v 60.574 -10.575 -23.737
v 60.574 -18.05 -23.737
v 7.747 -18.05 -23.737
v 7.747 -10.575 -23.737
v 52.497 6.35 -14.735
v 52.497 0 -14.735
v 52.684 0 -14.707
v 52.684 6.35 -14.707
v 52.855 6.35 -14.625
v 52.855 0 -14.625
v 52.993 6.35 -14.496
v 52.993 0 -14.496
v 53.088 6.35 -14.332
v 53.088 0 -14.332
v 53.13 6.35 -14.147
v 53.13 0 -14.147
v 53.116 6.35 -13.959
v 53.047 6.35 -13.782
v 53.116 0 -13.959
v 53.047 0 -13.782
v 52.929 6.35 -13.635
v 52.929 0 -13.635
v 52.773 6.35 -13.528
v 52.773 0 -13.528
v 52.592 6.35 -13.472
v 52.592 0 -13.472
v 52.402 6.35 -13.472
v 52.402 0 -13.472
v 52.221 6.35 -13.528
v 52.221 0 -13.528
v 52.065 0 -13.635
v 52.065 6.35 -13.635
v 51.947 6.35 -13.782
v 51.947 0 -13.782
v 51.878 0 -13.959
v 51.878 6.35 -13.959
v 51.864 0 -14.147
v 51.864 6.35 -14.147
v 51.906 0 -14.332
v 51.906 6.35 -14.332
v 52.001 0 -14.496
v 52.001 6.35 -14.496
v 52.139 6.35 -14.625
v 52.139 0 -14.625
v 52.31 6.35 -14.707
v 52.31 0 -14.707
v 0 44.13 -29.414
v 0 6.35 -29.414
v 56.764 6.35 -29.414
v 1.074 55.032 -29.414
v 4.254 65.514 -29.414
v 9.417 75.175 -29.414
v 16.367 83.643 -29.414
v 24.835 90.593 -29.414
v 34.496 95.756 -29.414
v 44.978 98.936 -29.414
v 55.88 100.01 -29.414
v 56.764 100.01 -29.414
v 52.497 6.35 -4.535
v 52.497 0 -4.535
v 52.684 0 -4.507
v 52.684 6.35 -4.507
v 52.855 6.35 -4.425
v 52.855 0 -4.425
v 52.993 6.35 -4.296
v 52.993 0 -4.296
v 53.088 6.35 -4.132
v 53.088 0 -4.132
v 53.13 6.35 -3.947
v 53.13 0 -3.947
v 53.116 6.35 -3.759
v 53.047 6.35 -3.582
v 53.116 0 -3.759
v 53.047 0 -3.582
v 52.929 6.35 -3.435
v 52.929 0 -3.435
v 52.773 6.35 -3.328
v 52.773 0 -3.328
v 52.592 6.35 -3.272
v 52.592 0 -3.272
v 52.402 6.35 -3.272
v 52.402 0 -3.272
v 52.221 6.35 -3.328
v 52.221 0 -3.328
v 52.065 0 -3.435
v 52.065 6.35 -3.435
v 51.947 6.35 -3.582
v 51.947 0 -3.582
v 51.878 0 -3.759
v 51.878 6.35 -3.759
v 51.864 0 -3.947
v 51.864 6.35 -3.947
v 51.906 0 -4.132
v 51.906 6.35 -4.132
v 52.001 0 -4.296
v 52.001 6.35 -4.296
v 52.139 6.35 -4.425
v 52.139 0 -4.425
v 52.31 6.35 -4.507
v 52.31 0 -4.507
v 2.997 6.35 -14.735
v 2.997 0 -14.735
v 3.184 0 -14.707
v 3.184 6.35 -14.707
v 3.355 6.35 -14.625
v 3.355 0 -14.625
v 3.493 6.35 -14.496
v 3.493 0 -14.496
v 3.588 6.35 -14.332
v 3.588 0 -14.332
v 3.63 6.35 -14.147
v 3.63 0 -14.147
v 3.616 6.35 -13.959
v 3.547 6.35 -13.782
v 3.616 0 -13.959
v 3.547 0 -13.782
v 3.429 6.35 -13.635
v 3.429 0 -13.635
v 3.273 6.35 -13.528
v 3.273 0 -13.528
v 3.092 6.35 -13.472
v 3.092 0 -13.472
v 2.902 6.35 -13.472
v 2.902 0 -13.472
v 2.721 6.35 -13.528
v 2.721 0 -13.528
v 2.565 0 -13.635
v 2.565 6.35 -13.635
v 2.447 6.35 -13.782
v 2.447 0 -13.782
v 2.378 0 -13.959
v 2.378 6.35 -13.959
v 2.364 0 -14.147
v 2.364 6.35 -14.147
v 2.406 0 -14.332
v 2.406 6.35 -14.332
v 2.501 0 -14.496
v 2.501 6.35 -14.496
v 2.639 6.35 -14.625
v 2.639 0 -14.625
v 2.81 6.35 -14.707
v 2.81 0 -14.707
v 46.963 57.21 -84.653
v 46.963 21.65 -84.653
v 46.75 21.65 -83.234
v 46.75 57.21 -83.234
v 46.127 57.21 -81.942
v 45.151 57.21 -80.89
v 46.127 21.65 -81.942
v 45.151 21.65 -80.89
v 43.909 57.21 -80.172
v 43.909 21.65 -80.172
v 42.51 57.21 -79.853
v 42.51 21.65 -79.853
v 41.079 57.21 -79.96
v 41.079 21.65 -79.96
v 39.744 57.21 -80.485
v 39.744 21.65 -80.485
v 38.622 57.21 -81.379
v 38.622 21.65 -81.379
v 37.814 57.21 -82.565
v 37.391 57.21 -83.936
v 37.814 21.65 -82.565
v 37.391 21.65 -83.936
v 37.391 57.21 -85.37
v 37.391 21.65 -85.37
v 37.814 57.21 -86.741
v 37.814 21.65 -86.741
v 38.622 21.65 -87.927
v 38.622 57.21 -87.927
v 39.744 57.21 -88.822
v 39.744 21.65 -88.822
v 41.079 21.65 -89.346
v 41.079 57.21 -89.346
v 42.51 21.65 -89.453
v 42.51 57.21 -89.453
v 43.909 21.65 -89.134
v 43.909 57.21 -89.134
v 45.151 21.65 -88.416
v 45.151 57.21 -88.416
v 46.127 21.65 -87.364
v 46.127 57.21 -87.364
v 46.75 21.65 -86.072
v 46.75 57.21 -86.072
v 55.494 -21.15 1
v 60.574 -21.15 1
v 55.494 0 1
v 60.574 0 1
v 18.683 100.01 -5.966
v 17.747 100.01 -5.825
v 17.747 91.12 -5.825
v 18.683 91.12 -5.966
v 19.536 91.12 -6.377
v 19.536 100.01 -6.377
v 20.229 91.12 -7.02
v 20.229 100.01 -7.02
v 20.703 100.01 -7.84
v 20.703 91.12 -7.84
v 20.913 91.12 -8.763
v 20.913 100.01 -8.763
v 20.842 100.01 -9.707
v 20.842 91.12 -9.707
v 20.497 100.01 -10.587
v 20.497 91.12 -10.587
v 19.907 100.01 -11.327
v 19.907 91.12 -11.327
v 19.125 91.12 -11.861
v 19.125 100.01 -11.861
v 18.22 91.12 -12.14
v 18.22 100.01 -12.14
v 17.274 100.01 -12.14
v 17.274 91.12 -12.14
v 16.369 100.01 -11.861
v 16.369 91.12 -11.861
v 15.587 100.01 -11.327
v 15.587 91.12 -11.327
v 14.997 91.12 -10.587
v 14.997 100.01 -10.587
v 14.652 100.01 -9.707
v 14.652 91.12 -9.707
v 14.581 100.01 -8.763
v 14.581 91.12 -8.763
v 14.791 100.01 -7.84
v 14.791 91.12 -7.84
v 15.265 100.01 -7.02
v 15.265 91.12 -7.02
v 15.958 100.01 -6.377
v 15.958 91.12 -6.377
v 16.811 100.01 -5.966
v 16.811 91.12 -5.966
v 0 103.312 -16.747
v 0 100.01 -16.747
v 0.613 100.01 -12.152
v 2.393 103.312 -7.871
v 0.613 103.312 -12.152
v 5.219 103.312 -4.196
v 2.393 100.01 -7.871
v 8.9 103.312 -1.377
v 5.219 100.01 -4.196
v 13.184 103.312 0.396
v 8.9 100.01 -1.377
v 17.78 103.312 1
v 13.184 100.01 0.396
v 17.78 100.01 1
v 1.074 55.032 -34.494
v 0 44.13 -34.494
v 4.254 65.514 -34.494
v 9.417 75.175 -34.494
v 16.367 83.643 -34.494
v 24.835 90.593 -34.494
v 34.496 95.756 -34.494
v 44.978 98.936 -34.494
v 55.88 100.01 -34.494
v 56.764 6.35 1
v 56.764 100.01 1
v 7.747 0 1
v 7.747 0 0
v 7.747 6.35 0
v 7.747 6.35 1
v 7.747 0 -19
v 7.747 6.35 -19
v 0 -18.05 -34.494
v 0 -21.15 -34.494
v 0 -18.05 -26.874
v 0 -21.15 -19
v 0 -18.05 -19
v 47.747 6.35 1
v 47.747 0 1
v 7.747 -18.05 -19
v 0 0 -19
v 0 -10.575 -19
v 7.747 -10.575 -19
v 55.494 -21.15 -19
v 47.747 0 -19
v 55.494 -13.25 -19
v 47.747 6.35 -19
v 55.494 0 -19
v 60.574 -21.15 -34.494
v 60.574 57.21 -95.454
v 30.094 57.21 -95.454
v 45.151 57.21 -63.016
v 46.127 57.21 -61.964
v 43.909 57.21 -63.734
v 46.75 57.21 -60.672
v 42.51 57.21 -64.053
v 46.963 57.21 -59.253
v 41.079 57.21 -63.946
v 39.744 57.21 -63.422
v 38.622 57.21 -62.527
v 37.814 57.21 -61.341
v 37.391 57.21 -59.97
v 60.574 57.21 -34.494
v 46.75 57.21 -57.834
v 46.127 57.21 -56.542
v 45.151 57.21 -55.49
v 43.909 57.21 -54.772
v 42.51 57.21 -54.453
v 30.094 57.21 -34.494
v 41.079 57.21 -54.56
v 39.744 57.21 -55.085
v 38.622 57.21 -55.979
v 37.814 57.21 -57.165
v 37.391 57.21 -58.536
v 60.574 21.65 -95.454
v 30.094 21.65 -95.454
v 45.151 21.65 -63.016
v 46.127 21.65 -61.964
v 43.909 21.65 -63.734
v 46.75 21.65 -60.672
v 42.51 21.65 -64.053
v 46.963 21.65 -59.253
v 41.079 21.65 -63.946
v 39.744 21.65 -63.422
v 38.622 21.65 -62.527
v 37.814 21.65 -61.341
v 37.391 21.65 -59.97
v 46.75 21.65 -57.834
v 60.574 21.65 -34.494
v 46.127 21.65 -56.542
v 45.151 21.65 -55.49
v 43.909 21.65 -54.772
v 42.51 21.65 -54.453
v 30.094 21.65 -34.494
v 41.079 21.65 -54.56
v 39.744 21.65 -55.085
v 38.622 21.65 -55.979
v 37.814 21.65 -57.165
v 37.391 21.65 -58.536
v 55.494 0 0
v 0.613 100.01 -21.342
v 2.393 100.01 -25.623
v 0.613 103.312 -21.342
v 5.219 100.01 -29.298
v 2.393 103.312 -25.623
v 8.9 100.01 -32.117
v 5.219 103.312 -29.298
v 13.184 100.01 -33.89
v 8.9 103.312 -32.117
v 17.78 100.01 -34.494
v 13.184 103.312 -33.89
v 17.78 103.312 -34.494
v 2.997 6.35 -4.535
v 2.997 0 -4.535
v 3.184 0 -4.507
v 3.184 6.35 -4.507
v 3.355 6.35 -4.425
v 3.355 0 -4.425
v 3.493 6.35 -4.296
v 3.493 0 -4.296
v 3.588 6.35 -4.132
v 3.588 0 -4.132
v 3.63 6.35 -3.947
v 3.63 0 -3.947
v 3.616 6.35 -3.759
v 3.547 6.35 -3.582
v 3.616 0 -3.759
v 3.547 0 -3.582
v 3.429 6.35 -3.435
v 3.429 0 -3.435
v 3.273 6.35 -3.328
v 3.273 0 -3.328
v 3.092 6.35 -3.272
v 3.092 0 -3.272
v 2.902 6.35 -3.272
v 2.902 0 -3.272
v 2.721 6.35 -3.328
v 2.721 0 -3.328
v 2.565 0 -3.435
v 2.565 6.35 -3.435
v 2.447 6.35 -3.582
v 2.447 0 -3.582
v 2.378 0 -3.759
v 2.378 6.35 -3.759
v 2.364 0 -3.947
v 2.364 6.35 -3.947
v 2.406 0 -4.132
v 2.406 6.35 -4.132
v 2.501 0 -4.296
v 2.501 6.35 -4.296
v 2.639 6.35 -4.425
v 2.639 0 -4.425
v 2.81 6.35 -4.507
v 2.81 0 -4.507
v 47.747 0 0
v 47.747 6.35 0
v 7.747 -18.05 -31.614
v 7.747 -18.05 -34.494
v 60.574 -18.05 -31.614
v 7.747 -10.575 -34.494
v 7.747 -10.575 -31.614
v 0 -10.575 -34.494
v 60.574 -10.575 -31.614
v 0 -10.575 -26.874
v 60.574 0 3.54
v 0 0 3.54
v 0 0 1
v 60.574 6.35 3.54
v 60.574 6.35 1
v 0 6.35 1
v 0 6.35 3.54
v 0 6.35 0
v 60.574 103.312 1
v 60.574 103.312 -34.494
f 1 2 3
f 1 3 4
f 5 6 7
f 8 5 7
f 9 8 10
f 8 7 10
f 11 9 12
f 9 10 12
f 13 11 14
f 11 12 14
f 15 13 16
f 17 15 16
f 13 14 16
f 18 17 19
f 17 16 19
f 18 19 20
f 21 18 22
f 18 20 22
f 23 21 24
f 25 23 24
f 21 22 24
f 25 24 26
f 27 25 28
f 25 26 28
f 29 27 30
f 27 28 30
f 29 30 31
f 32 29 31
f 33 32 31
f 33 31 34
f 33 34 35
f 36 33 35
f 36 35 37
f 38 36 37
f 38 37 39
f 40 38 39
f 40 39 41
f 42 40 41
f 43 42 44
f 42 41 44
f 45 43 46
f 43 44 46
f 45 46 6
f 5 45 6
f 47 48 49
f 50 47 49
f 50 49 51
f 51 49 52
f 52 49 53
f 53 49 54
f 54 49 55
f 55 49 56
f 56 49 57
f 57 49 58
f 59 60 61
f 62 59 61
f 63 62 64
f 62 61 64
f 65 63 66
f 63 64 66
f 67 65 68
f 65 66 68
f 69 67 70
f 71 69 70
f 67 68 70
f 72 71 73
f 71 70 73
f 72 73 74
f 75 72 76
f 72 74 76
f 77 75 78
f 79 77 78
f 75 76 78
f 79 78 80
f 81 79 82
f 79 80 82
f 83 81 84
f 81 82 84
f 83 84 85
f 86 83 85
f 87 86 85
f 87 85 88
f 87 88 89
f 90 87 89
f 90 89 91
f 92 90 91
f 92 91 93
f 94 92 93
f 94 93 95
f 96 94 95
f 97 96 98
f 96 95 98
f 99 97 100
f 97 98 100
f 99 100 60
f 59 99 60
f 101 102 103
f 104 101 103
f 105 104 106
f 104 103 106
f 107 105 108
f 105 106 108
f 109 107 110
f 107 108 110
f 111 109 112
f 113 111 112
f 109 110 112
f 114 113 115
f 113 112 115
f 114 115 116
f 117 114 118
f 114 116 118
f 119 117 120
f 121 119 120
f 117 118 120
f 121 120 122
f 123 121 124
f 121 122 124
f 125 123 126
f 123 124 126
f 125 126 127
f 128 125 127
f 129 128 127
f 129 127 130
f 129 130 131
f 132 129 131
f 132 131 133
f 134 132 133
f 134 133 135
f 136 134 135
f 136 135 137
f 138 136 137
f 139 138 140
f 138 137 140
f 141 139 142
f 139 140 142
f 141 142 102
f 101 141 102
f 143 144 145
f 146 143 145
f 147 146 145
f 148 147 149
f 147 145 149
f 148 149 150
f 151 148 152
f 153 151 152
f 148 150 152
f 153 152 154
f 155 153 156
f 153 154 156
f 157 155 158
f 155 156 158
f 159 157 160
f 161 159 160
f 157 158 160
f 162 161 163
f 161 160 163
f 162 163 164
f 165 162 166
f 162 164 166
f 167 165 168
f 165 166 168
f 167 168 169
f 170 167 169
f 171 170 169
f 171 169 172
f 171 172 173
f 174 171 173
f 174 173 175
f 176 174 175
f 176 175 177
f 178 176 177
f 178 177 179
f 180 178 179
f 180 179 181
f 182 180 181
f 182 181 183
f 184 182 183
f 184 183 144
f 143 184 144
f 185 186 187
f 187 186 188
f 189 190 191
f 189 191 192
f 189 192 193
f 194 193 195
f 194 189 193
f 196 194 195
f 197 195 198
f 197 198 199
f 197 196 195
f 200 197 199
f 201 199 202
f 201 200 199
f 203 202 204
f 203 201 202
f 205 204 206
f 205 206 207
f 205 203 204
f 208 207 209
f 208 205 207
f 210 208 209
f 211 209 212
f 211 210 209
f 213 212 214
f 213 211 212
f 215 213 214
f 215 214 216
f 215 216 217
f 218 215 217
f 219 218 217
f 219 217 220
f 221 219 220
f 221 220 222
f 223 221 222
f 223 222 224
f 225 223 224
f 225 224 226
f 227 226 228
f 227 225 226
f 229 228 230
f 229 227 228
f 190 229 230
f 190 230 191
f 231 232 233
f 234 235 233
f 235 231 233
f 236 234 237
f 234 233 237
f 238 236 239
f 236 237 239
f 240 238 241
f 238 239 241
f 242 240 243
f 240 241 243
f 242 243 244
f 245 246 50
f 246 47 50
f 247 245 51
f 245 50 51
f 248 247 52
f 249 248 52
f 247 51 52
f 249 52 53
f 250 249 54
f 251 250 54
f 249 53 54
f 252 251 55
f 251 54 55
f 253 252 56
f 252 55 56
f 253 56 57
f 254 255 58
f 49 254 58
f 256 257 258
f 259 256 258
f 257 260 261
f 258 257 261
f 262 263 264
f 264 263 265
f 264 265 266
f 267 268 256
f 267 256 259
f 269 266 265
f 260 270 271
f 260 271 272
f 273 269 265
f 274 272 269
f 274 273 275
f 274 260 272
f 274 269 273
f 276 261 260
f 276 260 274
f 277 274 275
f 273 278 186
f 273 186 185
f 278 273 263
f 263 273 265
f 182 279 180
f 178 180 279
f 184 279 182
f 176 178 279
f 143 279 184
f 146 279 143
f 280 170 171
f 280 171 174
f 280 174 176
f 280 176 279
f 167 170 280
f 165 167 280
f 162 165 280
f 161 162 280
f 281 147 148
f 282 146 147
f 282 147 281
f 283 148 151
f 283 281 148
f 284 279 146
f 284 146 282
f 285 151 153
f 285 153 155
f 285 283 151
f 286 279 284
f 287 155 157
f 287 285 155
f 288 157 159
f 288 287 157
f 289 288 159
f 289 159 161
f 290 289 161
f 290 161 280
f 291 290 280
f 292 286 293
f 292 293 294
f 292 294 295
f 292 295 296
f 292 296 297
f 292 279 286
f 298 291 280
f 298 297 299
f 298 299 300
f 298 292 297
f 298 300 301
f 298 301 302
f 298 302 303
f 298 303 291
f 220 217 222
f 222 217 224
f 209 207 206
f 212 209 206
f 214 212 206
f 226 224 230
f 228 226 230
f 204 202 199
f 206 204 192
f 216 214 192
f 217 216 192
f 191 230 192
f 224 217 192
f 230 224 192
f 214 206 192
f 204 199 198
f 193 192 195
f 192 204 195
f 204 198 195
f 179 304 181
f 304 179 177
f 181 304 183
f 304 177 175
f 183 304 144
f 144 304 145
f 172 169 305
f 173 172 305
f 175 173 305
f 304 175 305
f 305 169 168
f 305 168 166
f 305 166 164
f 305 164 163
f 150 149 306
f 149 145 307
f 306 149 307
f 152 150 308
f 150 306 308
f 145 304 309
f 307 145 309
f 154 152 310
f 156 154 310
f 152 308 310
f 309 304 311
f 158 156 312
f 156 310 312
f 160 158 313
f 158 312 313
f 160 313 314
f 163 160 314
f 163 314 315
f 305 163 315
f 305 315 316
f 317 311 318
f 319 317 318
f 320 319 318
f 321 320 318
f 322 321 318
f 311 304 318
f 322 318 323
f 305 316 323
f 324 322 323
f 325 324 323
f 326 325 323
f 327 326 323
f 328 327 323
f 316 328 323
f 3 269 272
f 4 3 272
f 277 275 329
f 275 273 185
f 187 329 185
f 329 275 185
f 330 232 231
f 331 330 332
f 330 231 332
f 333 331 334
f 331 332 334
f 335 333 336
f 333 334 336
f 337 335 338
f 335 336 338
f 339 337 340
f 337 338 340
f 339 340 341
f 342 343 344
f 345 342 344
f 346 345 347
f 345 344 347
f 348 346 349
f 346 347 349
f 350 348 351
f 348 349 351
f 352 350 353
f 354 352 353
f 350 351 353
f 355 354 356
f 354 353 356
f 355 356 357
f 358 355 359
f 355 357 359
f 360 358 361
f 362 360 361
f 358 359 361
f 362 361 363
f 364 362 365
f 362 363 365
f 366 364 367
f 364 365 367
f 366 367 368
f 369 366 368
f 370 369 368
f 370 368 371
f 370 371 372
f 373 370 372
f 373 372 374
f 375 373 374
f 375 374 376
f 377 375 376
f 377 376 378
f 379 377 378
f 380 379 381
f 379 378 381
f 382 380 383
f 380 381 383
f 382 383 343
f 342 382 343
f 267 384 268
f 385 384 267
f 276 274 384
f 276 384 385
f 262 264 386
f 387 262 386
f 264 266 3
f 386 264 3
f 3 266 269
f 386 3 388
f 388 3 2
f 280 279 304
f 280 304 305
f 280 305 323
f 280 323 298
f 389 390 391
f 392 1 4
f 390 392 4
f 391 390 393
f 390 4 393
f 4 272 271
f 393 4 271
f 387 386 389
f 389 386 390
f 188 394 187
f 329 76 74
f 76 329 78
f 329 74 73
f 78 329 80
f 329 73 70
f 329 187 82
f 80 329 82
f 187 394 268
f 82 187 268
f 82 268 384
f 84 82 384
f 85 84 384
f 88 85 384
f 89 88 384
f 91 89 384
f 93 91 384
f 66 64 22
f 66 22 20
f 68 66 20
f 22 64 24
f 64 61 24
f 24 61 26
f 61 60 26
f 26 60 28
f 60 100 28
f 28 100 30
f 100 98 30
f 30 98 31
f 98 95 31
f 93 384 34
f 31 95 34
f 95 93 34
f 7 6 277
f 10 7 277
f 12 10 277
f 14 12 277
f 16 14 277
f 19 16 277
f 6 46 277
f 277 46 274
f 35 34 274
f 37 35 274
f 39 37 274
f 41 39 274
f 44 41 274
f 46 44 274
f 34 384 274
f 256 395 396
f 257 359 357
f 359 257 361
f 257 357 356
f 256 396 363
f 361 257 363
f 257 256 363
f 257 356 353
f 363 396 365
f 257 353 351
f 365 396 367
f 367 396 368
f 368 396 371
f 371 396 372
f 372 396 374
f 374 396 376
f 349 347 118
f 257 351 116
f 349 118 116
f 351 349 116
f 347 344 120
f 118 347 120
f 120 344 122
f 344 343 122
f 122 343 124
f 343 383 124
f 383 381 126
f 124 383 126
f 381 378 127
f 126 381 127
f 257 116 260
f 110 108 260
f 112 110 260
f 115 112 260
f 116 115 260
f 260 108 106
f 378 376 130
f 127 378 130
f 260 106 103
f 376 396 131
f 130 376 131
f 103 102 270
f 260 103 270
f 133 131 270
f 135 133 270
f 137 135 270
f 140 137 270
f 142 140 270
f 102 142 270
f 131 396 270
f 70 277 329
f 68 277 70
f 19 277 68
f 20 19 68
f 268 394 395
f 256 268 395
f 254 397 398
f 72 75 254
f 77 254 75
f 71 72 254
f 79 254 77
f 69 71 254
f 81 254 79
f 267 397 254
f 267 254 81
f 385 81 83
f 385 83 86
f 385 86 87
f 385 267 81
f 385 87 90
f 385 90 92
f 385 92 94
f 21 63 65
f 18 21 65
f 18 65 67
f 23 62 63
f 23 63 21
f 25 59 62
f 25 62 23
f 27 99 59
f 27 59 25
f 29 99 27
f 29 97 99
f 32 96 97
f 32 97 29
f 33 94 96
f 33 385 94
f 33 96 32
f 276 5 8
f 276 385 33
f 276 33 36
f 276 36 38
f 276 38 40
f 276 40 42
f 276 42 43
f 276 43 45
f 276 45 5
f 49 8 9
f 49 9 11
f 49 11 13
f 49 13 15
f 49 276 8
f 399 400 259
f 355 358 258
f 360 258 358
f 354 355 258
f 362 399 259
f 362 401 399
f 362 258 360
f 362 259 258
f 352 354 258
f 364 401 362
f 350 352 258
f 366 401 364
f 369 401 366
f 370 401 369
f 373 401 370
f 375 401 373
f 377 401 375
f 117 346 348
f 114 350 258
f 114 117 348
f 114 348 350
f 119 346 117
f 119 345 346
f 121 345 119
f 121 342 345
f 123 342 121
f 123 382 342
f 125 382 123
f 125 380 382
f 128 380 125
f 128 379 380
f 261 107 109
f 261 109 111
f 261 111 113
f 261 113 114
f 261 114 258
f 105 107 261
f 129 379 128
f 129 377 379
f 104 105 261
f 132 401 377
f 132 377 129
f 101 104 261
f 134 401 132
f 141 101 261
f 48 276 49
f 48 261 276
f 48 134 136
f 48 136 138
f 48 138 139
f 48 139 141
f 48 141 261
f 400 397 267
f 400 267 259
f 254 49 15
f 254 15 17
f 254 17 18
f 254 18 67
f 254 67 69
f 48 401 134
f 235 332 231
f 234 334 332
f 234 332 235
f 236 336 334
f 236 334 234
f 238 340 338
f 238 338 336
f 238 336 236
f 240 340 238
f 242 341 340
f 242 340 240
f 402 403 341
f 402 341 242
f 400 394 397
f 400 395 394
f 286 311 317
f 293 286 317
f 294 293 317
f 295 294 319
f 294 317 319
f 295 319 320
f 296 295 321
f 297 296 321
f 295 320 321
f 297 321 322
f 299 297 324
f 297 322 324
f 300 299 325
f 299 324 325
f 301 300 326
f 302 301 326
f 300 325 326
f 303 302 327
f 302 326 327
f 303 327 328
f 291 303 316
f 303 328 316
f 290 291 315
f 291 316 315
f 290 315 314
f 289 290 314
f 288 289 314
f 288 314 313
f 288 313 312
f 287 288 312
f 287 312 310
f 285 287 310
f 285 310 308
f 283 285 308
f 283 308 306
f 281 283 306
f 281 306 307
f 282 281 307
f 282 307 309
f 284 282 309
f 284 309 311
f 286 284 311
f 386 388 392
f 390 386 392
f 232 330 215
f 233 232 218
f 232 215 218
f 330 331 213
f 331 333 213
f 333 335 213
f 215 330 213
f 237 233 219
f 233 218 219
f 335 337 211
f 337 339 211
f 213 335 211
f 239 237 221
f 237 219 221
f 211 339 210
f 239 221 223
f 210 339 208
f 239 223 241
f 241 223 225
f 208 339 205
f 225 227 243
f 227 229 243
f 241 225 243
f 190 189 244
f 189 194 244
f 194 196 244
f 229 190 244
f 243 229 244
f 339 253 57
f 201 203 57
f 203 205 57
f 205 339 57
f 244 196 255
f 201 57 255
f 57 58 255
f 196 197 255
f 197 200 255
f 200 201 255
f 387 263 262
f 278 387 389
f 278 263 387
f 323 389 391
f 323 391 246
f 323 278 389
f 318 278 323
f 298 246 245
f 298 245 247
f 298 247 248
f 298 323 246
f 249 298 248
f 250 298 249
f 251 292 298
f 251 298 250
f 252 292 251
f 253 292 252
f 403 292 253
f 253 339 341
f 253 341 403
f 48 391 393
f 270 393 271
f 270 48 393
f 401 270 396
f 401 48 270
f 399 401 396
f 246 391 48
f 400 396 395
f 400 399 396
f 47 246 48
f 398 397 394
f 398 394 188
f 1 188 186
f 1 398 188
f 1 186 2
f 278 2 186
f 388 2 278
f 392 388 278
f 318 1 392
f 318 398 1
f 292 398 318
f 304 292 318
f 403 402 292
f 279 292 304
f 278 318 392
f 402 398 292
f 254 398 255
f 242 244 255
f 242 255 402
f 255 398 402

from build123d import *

# Parameters (mm, degrees)
SKETCH1_W            = 55.49400001
SKETCH1_H            = 26.874
BOSS_EXTRUDE1_DEPTH  = 6.35
SKETCH2_W            = 40
SKETCH2_H            = 19
CUT_EXTRUDE1_DEPTH   = 6.35
SKETCH3_R            = 0.635
CUT_EXTRUDE2_DEPTH   = 6.35
SKETCH4_W            = 55.49400001
SKETCH4_H            = 7.874
BOSS_EXTRUDE2_DEPTH  = 21.15
SKETCH6_W            = 7.747000005
SKETCH6_H            = 6.35
BOSS_EXTRUDE3_DEPTH  = 1
SKETCH12_W           = 7.747000005
SKETCH12_H           = 7.475
CUT_EXTRUDE4_DEPTH   = 9.398
SKETCH13_W           = 7.747000005
SKETCH13_H           = 7.9
BOSS_EXTRUDE6_DEPTH  = 20
SKETCH14_W           = 27.874
SKETCH14_H           = 27.5
BOSS_EXTRUDE7_DEPTH  = 5.08
SKETCH16_W           = 3.81
SKETCH16_H           = 27.874
BOSS_EXTRUDE8_DEPTH  = 93.66
BOSS_EXTRUDE9_DEPTH  = 7.62
SKETCH18_W           = 5.08
SKETCH18_H           = 93.66
BOSS_EXTRUDE10_DEPTH = 56.76400001
SKETCH19_W           = 30.48
SKETCH19_H           = 35.56
BOSS_EXTRUDE11_DEPTH = 76.2
SKETCH20_R           = 4.813300002
SKETCH20_R_2         = 4.813299999
CUT_EXTRUDE5_DEPTH   = 76.2
SKETCH21_W           = 30.48
SKETCH21_H           = 35.56
CUT_EXTRUDE6_DEPTH   = 15.24
SKETCH23_W           = 7.876812164
SKETCH23_H           = 7.475
CUT_EXTRUDE7_DEPTH   = 54.102
FILLET1_R            = 55.88
SKETCH24_W           = 3.81
SKETCH24_H           = 35.494
BOSS_EXTRUDE12_DEPTH = 3.302
SKETCH25_W           = 35.494
SKETCH25_H           = 3.302
BOSS_EXTRUDE13_DEPTH = 56.76400001
FILLET2_R            = 17.78
SKETCH26_R           = 3.175
BOSS_EXTRUDE14_DEPTH = 8.89
SKETCH27_W           = 7.747000005
SKETCH27_H           = 20
CUT_EXTRUDE9_DEPTH   = 10.668
SKETCH28_W           = 7.747000005
SKETCH28_H           = 6.35
BOSS_EXTRUDE15_DEPTH = 2.54
SKETCH29_W           = 2.54
SKETCH29_H           = 6.35
BOSS_EXTRUDE16_DEPTH = 47.747000005
SKETCH30_W           = 2.54
SKETCH30_H           = 6.35
BOSS_EXTRUDE17_DEPTH = 5.08


with BuildPart() as part:
    # Sketch1 → Boss-Extrude1 (new body)
    with BuildSketch(Plane(origin=(0, 0, 0), x_dir=(1, 0, 0), z_dir=(0, 1, 0))):
        with Locations((27.747000005, 13.437)):
            Rectangle(SKETCH1_W, SKETCH1_H)
    extrude(amount=BOSS_EXTRUDE1_DEPTH)

    # Sketch2 → Cut-Extrude1 (cut)
    with BuildSketch(Plane(origin=(0, 6.35, 0), x_dir=(1, 0, 0), z_dir=(0, 1, 0))):
        with Locations((27.747000005, 9.5)):
            Rectangle(SKETCH2_W, SKETCH2_H)
    extrude(amount=-CUT_EXTRUDE1_DEPTH, mode=Mode.SUBTRACT)

    # Sketch3 → Cut-Extrude2 (cut)
    with BuildSketch(Plane.XZ):
        with Locations(Location((2.997000004, -14.099999999, 0), (0, 0, 270))):
            Circle(SKETCH3_R)
        with Locations(Location((2.997000004, -3.899999999, 0), (0, 0, 270))):
            Circle(SKETCH3_R)
        with Locations(Location((52.497000004, -14.099999999, 0), (0, 0, 270))):
            Circle(SKETCH3_R)
        with Locations(Location((52.497000004, -3.899999999, 0), (0, 0, 270))):
            Circle(SKETCH3_R)
    extrude(amount=-CUT_EXTRUDE2_DEPTH, mode=Mode.SUBTRACT)

    # Sketch4 → Boss-Extrude2 (add)
    with BuildSketch(Plane.XZ):
        with Locations((27.747000005, -22.937)):
            Rectangle(SKETCH4_W, SKETCH4_H)
    extrude(amount=BOSS_EXTRUDE2_DEPTH)

    # Sketch6 → Boss-Extrude3 (add)
    with BuildSketch(Plane.XY):
        with Locations((3.873500003, 3.175)):
            Rectangle(SKETCH6_W, SKETCH6_H)
        with Locations((51.620500007, 3.175)):
            Rectangle(SKETCH6_W, SKETCH6_H)
    extrude(amount=BOSS_EXTRUDE3_DEPTH)

    # Sketch12 → Cut-Extrude4 (cut)
    with BuildSketch(Plane.XY.offset(-19)):
        with Locations((3.873500003, -14.3125)):
            Rectangle(SKETCH12_W, SKETCH12_H)
    extrude(amount=-CUT_EXTRUDE4_DEPTH, mode=Mode.SUBTRACT)

    # Sketch13 → Boss-Extrude6 (add)
    with BuildSketch(Plane.XY.offset(-19)):
        with Locations((51.620500007, -17.2)):
            Rectangle(SKETCH13_W, SKETCH13_H)
    extrude(amount=BOSS_EXTRUDE6_DEPTH)

    # Sketch14 → Boss-Extrude7 (add)
    with BuildSketch(Plane(origin=(55.49400001, 0, 0), x_dir=(0, 0, -1), z_dir=(1, 0, 0))):
        with Locations((12.937, -7.4)):
            Rectangle(SKETCH14_W, SKETCH14_H)
    extrude(amount=BOSS_EXTRUDE7_DEPTH)

    # Sketch16 → Boss-Extrude8 (add)
    with BuildSketch(Plane(origin=(0, 6.35, 0), x_dir=(1, 0, 0), z_dir=(0, 1, 0))):
        with Locations((58.66900001, 12.937)):
            Rectangle(SKETCH16_W, SKETCH16_H)
    extrude(amount=BOSS_EXTRUDE8_DEPTH)

    # Sketch17 → Boss-Extrude9 (add)
    with BuildSketch(Plane(origin=(0, 0, -26.874), x_dir=(-1, 0, 0), z_dir=(0, 0, -1))):
        Polygon((0, -21.15), (0, -18.05), (-7.747000005, -18.05), (-7.747000005, -10.575), (0, -10.575), (0, 6.35), (-56.76400001, 6.35), (-56.76400001, 100.01), (-60.57400001, 100.01), (-60.57400001, -21.15), align=None)
    extrude(amount=BOSS_EXTRUDE9_DEPTH)

    # Sketch18 → Boss-Extrude10 (add)
    with BuildSketch(Plane.ZY.offset(-56.76400001)):
        with Locations((-31.954, 53.18)):
            Rectangle(SKETCH18_W, SKETCH18_H)
    extrude(amount=BOSS_EXTRUDE10_DEPTH)

    # Sketch19 → Boss-Extrude11 (add)
    with BuildSketch(Plane(origin=(0, 0, -34.494), x_dir=(-1, 0, 0), z_dir=(0, 0, -1))):
        with Locations((-45.33400001, 39.43)):
            Rectangle(SKETCH19_W, SKETCH19_H)
    extrude(amount=BOSS_EXTRUDE11_DEPTH)

    # Sketch20 → Cut-Extrude5 (cut)
    with BuildSketch(Plane.XZ.offset(-21.65)):
        with Locations((42.150157054, -59.253068288)):
            Circle(SKETCH20_R)
        with Locations((42.150157054, -84.653068288)):
            Circle(SKETCH20_R_2)
    extrude(amount=-CUT_EXTRUDE5_DEPTH, mode=Mode.SUBTRACT)

    # Sketch21 → Cut-Extrude6 (cut)
    with BuildSketch(Plane(origin=(0, 0, -110.694), x_dir=(-1, 0, 0), z_dir=(0, 0, -1))):
        with Locations((-45.33400001, 39.43)):
            Rectangle(SKETCH21_W, SKETCH21_H)
    extrude(amount=-CUT_EXTRUDE6_DEPTH, mode=Mode.SUBTRACT)

    # Sketch23 → Cut-Extrude7 (cut)
    with BuildSketch(Plane.ZY.offset(-7.747000005)):
        with Locations((-27.675104405, -14.3125)):
            Rectangle(SKETCH23_W, SKETCH23_H)
    extrude(amount=-CUT_EXTRUDE7_DEPTH, mode=Mode.SUBTRACT)

    # Fillet1
    fillet1_edges = [part.edges().sort_by_distance(p)[0] for p in [
        (0, 100.01, -31.954),
    ]]
    fillet(fillet1_edges, radius=FILLET1_R)

    # Sketch24 → Boss-Extrude12 (add)
    with BuildSketch(Plane(origin=(0, 100.01, 0), x_dir=(1, 0, 0), z_dir=(0, 1, 0))):
        with Locations((58.66900001, 16.747)):
            Rectangle(SKETCH24_W, SKETCH24_H)
    extrude(amount=BOSS_EXTRUDE12_DEPTH)

    # Sketch25 → Boss-Extrude13 (add)
    with BuildSketch(Plane.ZY.offset(-56.76400001)):
        with Locations((-16.747, 101.661)):
            Rectangle(SKETCH25_W, SKETCH25_H)
    extrude(amount=BOSS_EXTRUDE13_DEPTH)

    # Fillet2
    # the kernel refuses this fillet: 17.78 mm, written as the material it takes off along each edge
    with BuildSketch(Plane(origin=(0, 55.56, 1), x_dir=(0, 0, -1), z_dir=(0, 1, 0))) as fillet2_piece_1:
        with BuildLine():
            CenterArc((FILLET2_R, -FILLET2_R), FILLET2_R, 90, 90)
            Line((0, -FILLET2_R), (0, 0))
            Line((0, 0), (FILLET2_R, 0))
        make_face()
    extrude(amount=92.202000001, mode=Mode.SUBTRACT)
    with BuildSketch(Plane(origin=(0, 147.762, -34.494), x_dir=(0, 0, 1), z_dir=(0, -1, 0))) as fillet2_piece_2:
        with BuildLine():
            CenterArc((FILLET2_R, -FILLET2_R), FILLET2_R, 90, 90)
            Line((0, -FILLET2_R), (0, 0))
            Line((0, 0), (FILLET2_R, 0))
        make_face()
    extrude(amount=47.752, mode=Mode.SUBTRACT)

    # Sketch26 → Boss-Extrude14 (add)
    with BuildSketch(Plane(origin=(0, 100.01, 0), x_dir=(1, 0, 0), z_dir=(0, 1, 0))):
        with Locations(Location((17.747000004, 8.999999999, 0), (0, 0, 270))):
            Circle(SKETCH26_R)
    extrude(amount=-BOSS_EXTRUDE14_DEPTH)

    # Sketch27 → Cut-Extrude9 (cut)
    with BuildSketch(Plane.XZ.offset(21.15)):
        with Locations((51.620500007, -9)):
            Rectangle(SKETCH27_W, SKETCH27_H)
    extrude(amount=-CUT_EXTRUDE9_DEPTH, mode=Mode.SUBTRACT)

    # Sketch28 → Boss-Extrude15 (add)
    with BuildSketch(Plane.XY.offset(1)):
        with Locations((51.620500007, 3.175)):
            Rectangle(SKETCH28_W, SKETCH28_H)
    extrude(amount=BOSS_EXTRUDE15_DEPTH)

    # Sketch29 → Boss-Extrude16 (add)
    with BuildSketch(Plane.ZY.offset(-47.747000005)):
        with Locations((2.27, 3.175)):
            Rectangle(SKETCH29_W, SKETCH29_H)
    extrude(amount=BOSS_EXTRUDE16_DEPTH)

    # Sketch30 → Boss-Extrude17 (add)
    with BuildSketch(Plane(origin=(55.49400001, 0, 0), x_dir=(0, 0, -1), z_dir=(1, 0, 0))):
        with Locations((-2.27, 3.175)):
            Rectangle(SKETCH30_W, SKETCH30_H)
    extrude(amount=BOSS_EXTRUDE17_DEPTH)


solid = part.part
